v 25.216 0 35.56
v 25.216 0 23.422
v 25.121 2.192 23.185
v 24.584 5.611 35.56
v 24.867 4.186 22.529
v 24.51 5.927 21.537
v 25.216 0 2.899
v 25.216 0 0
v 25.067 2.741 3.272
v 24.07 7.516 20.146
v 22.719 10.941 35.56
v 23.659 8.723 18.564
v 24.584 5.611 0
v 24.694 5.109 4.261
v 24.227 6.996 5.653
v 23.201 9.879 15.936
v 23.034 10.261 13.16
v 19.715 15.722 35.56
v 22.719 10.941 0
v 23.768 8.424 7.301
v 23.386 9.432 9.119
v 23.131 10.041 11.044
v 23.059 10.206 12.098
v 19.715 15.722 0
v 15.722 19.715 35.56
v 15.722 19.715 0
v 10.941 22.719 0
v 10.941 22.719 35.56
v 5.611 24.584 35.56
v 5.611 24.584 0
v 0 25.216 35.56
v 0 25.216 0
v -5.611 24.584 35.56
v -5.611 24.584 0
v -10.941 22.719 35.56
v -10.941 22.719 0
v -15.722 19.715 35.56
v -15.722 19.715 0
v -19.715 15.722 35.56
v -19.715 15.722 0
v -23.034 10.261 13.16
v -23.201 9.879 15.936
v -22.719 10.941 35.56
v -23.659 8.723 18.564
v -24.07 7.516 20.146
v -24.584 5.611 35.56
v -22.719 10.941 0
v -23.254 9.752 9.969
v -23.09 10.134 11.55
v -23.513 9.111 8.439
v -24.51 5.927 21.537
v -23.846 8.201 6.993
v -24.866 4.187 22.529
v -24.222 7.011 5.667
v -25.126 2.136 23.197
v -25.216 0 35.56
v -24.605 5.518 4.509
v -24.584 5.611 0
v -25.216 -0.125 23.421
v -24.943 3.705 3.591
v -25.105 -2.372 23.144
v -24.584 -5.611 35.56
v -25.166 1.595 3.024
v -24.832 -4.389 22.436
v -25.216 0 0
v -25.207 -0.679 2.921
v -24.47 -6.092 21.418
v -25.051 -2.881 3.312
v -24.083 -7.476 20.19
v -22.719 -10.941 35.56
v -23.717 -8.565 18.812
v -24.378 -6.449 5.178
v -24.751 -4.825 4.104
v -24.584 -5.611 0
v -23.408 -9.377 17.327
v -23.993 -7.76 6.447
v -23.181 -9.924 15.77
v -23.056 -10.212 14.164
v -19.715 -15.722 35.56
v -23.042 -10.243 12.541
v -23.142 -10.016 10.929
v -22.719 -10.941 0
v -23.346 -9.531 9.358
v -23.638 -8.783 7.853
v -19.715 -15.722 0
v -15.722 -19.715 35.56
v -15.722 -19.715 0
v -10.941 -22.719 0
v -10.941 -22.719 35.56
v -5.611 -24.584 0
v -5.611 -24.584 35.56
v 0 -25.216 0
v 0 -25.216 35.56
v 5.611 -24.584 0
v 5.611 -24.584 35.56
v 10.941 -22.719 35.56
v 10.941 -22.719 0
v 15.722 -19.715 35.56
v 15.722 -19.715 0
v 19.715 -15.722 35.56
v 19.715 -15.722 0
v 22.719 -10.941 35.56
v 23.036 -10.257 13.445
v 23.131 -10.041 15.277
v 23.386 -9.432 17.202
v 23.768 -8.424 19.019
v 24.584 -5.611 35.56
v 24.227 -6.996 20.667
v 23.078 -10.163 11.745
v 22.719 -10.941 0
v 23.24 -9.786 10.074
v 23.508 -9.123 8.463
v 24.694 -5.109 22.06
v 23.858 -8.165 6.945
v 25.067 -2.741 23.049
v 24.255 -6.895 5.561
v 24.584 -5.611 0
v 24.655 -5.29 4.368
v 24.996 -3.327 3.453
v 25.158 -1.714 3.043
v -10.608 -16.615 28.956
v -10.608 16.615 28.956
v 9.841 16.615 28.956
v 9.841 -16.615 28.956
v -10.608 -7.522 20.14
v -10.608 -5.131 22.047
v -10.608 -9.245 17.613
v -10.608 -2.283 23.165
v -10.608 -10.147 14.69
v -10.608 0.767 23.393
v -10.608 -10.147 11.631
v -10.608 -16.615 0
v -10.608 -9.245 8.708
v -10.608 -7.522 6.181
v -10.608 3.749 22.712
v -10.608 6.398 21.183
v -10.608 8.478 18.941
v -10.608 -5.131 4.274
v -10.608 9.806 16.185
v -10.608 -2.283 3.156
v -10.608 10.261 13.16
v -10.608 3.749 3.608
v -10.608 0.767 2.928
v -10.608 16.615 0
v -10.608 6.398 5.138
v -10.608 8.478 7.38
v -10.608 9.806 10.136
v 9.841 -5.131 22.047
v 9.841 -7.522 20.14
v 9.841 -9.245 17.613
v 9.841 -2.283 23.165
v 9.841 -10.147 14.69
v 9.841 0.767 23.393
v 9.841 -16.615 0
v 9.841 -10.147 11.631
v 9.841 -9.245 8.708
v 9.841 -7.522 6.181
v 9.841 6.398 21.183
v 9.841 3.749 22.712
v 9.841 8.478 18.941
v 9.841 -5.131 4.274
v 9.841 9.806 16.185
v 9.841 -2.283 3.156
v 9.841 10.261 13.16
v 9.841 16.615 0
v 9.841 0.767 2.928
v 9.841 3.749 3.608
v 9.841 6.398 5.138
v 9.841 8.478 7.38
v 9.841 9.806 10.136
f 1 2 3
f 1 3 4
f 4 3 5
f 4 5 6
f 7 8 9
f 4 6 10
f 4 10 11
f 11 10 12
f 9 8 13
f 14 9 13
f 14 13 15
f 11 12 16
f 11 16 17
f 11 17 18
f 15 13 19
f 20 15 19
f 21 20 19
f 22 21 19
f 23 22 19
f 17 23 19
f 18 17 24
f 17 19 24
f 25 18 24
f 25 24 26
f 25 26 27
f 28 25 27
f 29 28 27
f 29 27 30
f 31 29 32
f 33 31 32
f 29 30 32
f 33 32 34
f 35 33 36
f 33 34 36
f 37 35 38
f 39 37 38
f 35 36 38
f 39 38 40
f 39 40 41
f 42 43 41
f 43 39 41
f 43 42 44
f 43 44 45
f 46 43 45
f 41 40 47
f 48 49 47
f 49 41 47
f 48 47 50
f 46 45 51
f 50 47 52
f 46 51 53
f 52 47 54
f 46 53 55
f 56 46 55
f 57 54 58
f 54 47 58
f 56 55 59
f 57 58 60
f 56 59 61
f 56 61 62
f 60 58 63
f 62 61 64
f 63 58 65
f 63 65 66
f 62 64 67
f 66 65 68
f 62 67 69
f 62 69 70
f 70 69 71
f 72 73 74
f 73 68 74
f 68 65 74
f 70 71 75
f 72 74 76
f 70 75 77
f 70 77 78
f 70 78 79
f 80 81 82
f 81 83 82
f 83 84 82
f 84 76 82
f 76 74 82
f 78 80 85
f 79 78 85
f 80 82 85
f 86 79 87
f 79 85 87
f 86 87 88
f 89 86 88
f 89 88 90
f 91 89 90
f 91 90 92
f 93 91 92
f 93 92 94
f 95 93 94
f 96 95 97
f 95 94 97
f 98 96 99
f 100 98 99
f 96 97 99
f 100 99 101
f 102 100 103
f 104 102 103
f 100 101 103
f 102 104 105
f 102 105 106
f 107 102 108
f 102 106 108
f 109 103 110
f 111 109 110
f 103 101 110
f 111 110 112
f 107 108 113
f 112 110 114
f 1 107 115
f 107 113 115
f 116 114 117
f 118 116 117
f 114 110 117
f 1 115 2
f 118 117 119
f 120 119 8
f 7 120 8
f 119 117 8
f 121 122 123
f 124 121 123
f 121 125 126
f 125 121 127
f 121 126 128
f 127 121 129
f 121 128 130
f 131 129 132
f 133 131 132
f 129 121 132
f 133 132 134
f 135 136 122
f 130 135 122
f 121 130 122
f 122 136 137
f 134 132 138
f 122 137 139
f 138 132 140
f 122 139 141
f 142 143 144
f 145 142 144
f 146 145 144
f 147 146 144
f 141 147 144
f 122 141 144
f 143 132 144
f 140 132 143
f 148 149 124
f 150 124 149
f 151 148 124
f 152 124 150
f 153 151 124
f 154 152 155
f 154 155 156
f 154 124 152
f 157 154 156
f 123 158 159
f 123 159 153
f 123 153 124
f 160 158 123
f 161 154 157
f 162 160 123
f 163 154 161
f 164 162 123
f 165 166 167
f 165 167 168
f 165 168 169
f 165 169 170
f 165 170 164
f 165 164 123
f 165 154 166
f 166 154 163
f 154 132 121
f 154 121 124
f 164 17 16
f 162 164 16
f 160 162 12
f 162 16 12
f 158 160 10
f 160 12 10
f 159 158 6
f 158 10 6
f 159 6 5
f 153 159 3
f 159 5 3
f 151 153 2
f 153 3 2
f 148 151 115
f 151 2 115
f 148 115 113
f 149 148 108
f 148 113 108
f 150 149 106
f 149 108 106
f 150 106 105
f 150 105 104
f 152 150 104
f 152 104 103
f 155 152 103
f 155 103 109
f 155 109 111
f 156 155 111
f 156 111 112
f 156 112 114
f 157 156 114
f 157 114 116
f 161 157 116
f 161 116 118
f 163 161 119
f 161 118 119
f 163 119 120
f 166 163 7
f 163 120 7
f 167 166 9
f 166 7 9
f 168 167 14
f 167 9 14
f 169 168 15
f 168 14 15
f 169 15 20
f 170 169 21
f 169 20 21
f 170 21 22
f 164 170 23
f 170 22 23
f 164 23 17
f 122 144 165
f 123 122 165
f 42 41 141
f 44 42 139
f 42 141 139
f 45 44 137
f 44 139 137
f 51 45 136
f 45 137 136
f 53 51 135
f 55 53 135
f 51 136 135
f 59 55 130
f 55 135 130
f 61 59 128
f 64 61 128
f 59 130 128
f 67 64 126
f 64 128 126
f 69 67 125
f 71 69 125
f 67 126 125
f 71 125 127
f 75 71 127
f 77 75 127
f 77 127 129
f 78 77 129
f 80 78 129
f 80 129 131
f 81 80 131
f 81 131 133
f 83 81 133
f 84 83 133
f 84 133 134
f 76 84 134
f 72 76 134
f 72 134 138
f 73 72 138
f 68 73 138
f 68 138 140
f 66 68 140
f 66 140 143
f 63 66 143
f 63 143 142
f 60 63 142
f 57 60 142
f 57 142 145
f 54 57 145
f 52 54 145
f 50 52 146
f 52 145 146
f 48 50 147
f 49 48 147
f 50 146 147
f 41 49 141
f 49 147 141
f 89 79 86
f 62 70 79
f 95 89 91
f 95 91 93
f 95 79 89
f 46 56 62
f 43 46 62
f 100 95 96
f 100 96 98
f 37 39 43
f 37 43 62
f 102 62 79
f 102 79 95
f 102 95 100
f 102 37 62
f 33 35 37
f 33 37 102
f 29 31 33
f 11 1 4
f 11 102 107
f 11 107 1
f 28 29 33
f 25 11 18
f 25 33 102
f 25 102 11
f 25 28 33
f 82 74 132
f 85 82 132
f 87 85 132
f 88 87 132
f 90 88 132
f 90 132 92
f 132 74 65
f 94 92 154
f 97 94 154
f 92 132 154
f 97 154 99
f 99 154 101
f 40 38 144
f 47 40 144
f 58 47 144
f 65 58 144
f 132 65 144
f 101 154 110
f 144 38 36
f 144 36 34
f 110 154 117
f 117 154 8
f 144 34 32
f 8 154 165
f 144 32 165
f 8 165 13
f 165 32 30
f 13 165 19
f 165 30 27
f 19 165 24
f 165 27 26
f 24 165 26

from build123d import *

# Parameters (mm, degrees)
F0_R     = 25.216468
F1_DEPTH = 35.56
F2_W     = 20.449843
F2_H     = 33.23099
F3_DEPTH = 28.956
F5_R     = 10.26144
F6_DEPTH = 65.532


with BuildPart() as f1:
    # F0 (on Top) → F1 (new body)
    with BuildSketch(Plane.XY):
        Circle(F0_R)
    extrude(amount=F1_DEPTH)

    # F2 (on Top) → F3 (cut)
    with BuildSketch(Plane.XY):
        with Locations((-0.383434, 0)):
            Rectangle(F2_W, F2_H)
    extrude(amount=F3_DEPTH, mode=Mode.SUBTRACT)

    # F5 (on offset) → F6 (cut)
    with BuildSketch(Plane.YZ.offset(30.226)):
        with Locations((0, 13.160355)):
            Circle(F5_R)
    extrude(amount=-F6_DEPTH, mode=Mode.SUBTRACT)


solid = f1.part
